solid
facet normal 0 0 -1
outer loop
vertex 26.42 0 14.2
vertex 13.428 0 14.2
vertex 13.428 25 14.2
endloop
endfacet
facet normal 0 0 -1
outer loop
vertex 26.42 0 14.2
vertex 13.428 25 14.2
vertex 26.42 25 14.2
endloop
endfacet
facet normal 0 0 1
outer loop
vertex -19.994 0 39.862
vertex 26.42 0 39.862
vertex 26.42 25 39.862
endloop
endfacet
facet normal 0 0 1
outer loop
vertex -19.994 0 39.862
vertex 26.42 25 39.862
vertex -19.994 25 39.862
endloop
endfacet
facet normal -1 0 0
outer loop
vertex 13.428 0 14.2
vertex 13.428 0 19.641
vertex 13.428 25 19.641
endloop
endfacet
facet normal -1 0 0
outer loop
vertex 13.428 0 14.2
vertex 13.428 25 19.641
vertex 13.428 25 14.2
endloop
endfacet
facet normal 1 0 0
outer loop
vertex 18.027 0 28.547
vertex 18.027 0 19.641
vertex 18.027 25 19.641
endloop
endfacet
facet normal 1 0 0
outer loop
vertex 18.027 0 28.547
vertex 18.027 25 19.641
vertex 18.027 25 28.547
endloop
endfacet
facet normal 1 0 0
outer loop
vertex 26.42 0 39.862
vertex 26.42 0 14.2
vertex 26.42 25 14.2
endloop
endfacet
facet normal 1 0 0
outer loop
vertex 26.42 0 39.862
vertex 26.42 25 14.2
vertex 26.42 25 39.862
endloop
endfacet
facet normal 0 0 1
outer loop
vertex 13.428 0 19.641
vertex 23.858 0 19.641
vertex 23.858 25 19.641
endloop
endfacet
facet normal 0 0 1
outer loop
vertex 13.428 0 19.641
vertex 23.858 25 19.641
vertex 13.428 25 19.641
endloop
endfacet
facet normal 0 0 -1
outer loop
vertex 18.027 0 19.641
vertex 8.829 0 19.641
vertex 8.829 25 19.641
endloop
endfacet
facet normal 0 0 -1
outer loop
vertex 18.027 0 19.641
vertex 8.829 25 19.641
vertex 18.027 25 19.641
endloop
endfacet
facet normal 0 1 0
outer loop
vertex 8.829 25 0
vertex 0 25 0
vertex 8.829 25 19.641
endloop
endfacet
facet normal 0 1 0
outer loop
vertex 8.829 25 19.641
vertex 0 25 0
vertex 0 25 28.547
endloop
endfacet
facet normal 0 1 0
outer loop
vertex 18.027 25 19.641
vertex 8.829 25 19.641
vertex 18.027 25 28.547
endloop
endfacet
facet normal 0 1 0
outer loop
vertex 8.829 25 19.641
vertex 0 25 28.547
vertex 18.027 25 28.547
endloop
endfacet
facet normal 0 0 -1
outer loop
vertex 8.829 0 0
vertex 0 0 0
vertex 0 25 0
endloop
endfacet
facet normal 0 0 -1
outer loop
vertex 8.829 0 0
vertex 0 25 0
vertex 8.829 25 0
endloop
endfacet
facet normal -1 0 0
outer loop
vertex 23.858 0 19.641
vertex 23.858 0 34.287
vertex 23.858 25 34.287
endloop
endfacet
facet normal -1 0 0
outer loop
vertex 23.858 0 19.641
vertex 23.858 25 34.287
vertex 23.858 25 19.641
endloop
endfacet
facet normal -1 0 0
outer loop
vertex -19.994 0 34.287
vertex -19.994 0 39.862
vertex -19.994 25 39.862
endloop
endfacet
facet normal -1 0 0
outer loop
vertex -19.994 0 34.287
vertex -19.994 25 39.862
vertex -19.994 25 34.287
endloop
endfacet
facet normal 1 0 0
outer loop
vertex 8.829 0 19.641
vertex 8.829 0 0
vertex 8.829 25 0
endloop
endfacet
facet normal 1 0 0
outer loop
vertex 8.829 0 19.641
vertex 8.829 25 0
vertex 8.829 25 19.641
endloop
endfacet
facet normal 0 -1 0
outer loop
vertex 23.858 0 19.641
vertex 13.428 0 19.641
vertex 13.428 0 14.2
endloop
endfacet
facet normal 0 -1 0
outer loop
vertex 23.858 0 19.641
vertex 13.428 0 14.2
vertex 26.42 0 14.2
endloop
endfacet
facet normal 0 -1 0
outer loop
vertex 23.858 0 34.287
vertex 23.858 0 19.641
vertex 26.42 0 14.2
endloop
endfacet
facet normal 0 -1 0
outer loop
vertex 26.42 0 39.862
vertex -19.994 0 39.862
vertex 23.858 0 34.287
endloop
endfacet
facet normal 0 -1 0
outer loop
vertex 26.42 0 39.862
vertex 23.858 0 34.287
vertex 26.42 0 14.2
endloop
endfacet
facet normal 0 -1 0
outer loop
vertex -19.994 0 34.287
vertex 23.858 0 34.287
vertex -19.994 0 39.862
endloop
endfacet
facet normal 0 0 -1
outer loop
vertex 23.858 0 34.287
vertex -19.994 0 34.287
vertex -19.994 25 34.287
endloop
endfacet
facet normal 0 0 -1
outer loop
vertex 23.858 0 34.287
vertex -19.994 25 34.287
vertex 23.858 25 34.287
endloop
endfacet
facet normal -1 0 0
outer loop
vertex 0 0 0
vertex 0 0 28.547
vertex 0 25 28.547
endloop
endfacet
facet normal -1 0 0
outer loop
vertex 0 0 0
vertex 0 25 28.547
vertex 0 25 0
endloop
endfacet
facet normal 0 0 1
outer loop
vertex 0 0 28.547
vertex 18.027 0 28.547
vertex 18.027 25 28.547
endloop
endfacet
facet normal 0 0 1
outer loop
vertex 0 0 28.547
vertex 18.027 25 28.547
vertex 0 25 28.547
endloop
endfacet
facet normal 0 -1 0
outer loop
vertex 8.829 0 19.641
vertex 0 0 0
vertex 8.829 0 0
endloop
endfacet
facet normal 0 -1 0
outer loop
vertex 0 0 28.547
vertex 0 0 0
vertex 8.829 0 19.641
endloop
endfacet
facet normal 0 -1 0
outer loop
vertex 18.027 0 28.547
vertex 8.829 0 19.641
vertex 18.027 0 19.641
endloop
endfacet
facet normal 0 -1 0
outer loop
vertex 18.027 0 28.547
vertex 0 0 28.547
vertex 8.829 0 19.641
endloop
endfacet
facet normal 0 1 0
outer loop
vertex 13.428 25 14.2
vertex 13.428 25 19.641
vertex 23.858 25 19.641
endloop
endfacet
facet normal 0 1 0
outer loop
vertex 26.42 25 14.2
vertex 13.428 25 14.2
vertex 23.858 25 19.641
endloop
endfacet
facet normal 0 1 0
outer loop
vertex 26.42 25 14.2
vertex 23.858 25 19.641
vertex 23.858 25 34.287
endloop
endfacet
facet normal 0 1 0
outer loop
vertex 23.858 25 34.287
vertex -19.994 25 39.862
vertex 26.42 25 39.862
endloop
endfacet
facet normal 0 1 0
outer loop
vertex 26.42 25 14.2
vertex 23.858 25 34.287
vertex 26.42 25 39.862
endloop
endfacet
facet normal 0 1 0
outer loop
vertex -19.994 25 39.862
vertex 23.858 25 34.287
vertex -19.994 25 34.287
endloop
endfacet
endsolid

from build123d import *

# Parameters (mm, degrees)
F1_DEPTH = 25
F3_DEPTH = 25


with BuildPart() as f1:
    # F0 (on Front) → F1 (new body)
    with BuildSketch(Plane.XZ):
        Polygon((18.027484, 28.546689), (0, 28.546689), (0, 0), (8.829273, 0), (8.829273, 19.641139), (18.027484, 19.641139), align=None)
    extrude(amount=-F1_DEPTH)


with BuildPart() as f3:
    # F2 (on face) → F3 (new body)
    with BuildSketch(Plane.XZ):
        Polygon((23.857851, 19.641139), (13.428379, 19.641139), (13.428379, 14.20033), (26.419755, 14.20033), (26.419755, 19.641139), align=None)
        Polygon((23.857851, 34.287322), (23.857851, 19.641139), (26.419755, 19.641139), (26.419755, 39.862372), (-19.993745, 39.862372), (-19.993745, 34.287322), align=None)
    extrude(amount=-F3_DEPTH)


solid = Compound([f1.part, f3.part])
